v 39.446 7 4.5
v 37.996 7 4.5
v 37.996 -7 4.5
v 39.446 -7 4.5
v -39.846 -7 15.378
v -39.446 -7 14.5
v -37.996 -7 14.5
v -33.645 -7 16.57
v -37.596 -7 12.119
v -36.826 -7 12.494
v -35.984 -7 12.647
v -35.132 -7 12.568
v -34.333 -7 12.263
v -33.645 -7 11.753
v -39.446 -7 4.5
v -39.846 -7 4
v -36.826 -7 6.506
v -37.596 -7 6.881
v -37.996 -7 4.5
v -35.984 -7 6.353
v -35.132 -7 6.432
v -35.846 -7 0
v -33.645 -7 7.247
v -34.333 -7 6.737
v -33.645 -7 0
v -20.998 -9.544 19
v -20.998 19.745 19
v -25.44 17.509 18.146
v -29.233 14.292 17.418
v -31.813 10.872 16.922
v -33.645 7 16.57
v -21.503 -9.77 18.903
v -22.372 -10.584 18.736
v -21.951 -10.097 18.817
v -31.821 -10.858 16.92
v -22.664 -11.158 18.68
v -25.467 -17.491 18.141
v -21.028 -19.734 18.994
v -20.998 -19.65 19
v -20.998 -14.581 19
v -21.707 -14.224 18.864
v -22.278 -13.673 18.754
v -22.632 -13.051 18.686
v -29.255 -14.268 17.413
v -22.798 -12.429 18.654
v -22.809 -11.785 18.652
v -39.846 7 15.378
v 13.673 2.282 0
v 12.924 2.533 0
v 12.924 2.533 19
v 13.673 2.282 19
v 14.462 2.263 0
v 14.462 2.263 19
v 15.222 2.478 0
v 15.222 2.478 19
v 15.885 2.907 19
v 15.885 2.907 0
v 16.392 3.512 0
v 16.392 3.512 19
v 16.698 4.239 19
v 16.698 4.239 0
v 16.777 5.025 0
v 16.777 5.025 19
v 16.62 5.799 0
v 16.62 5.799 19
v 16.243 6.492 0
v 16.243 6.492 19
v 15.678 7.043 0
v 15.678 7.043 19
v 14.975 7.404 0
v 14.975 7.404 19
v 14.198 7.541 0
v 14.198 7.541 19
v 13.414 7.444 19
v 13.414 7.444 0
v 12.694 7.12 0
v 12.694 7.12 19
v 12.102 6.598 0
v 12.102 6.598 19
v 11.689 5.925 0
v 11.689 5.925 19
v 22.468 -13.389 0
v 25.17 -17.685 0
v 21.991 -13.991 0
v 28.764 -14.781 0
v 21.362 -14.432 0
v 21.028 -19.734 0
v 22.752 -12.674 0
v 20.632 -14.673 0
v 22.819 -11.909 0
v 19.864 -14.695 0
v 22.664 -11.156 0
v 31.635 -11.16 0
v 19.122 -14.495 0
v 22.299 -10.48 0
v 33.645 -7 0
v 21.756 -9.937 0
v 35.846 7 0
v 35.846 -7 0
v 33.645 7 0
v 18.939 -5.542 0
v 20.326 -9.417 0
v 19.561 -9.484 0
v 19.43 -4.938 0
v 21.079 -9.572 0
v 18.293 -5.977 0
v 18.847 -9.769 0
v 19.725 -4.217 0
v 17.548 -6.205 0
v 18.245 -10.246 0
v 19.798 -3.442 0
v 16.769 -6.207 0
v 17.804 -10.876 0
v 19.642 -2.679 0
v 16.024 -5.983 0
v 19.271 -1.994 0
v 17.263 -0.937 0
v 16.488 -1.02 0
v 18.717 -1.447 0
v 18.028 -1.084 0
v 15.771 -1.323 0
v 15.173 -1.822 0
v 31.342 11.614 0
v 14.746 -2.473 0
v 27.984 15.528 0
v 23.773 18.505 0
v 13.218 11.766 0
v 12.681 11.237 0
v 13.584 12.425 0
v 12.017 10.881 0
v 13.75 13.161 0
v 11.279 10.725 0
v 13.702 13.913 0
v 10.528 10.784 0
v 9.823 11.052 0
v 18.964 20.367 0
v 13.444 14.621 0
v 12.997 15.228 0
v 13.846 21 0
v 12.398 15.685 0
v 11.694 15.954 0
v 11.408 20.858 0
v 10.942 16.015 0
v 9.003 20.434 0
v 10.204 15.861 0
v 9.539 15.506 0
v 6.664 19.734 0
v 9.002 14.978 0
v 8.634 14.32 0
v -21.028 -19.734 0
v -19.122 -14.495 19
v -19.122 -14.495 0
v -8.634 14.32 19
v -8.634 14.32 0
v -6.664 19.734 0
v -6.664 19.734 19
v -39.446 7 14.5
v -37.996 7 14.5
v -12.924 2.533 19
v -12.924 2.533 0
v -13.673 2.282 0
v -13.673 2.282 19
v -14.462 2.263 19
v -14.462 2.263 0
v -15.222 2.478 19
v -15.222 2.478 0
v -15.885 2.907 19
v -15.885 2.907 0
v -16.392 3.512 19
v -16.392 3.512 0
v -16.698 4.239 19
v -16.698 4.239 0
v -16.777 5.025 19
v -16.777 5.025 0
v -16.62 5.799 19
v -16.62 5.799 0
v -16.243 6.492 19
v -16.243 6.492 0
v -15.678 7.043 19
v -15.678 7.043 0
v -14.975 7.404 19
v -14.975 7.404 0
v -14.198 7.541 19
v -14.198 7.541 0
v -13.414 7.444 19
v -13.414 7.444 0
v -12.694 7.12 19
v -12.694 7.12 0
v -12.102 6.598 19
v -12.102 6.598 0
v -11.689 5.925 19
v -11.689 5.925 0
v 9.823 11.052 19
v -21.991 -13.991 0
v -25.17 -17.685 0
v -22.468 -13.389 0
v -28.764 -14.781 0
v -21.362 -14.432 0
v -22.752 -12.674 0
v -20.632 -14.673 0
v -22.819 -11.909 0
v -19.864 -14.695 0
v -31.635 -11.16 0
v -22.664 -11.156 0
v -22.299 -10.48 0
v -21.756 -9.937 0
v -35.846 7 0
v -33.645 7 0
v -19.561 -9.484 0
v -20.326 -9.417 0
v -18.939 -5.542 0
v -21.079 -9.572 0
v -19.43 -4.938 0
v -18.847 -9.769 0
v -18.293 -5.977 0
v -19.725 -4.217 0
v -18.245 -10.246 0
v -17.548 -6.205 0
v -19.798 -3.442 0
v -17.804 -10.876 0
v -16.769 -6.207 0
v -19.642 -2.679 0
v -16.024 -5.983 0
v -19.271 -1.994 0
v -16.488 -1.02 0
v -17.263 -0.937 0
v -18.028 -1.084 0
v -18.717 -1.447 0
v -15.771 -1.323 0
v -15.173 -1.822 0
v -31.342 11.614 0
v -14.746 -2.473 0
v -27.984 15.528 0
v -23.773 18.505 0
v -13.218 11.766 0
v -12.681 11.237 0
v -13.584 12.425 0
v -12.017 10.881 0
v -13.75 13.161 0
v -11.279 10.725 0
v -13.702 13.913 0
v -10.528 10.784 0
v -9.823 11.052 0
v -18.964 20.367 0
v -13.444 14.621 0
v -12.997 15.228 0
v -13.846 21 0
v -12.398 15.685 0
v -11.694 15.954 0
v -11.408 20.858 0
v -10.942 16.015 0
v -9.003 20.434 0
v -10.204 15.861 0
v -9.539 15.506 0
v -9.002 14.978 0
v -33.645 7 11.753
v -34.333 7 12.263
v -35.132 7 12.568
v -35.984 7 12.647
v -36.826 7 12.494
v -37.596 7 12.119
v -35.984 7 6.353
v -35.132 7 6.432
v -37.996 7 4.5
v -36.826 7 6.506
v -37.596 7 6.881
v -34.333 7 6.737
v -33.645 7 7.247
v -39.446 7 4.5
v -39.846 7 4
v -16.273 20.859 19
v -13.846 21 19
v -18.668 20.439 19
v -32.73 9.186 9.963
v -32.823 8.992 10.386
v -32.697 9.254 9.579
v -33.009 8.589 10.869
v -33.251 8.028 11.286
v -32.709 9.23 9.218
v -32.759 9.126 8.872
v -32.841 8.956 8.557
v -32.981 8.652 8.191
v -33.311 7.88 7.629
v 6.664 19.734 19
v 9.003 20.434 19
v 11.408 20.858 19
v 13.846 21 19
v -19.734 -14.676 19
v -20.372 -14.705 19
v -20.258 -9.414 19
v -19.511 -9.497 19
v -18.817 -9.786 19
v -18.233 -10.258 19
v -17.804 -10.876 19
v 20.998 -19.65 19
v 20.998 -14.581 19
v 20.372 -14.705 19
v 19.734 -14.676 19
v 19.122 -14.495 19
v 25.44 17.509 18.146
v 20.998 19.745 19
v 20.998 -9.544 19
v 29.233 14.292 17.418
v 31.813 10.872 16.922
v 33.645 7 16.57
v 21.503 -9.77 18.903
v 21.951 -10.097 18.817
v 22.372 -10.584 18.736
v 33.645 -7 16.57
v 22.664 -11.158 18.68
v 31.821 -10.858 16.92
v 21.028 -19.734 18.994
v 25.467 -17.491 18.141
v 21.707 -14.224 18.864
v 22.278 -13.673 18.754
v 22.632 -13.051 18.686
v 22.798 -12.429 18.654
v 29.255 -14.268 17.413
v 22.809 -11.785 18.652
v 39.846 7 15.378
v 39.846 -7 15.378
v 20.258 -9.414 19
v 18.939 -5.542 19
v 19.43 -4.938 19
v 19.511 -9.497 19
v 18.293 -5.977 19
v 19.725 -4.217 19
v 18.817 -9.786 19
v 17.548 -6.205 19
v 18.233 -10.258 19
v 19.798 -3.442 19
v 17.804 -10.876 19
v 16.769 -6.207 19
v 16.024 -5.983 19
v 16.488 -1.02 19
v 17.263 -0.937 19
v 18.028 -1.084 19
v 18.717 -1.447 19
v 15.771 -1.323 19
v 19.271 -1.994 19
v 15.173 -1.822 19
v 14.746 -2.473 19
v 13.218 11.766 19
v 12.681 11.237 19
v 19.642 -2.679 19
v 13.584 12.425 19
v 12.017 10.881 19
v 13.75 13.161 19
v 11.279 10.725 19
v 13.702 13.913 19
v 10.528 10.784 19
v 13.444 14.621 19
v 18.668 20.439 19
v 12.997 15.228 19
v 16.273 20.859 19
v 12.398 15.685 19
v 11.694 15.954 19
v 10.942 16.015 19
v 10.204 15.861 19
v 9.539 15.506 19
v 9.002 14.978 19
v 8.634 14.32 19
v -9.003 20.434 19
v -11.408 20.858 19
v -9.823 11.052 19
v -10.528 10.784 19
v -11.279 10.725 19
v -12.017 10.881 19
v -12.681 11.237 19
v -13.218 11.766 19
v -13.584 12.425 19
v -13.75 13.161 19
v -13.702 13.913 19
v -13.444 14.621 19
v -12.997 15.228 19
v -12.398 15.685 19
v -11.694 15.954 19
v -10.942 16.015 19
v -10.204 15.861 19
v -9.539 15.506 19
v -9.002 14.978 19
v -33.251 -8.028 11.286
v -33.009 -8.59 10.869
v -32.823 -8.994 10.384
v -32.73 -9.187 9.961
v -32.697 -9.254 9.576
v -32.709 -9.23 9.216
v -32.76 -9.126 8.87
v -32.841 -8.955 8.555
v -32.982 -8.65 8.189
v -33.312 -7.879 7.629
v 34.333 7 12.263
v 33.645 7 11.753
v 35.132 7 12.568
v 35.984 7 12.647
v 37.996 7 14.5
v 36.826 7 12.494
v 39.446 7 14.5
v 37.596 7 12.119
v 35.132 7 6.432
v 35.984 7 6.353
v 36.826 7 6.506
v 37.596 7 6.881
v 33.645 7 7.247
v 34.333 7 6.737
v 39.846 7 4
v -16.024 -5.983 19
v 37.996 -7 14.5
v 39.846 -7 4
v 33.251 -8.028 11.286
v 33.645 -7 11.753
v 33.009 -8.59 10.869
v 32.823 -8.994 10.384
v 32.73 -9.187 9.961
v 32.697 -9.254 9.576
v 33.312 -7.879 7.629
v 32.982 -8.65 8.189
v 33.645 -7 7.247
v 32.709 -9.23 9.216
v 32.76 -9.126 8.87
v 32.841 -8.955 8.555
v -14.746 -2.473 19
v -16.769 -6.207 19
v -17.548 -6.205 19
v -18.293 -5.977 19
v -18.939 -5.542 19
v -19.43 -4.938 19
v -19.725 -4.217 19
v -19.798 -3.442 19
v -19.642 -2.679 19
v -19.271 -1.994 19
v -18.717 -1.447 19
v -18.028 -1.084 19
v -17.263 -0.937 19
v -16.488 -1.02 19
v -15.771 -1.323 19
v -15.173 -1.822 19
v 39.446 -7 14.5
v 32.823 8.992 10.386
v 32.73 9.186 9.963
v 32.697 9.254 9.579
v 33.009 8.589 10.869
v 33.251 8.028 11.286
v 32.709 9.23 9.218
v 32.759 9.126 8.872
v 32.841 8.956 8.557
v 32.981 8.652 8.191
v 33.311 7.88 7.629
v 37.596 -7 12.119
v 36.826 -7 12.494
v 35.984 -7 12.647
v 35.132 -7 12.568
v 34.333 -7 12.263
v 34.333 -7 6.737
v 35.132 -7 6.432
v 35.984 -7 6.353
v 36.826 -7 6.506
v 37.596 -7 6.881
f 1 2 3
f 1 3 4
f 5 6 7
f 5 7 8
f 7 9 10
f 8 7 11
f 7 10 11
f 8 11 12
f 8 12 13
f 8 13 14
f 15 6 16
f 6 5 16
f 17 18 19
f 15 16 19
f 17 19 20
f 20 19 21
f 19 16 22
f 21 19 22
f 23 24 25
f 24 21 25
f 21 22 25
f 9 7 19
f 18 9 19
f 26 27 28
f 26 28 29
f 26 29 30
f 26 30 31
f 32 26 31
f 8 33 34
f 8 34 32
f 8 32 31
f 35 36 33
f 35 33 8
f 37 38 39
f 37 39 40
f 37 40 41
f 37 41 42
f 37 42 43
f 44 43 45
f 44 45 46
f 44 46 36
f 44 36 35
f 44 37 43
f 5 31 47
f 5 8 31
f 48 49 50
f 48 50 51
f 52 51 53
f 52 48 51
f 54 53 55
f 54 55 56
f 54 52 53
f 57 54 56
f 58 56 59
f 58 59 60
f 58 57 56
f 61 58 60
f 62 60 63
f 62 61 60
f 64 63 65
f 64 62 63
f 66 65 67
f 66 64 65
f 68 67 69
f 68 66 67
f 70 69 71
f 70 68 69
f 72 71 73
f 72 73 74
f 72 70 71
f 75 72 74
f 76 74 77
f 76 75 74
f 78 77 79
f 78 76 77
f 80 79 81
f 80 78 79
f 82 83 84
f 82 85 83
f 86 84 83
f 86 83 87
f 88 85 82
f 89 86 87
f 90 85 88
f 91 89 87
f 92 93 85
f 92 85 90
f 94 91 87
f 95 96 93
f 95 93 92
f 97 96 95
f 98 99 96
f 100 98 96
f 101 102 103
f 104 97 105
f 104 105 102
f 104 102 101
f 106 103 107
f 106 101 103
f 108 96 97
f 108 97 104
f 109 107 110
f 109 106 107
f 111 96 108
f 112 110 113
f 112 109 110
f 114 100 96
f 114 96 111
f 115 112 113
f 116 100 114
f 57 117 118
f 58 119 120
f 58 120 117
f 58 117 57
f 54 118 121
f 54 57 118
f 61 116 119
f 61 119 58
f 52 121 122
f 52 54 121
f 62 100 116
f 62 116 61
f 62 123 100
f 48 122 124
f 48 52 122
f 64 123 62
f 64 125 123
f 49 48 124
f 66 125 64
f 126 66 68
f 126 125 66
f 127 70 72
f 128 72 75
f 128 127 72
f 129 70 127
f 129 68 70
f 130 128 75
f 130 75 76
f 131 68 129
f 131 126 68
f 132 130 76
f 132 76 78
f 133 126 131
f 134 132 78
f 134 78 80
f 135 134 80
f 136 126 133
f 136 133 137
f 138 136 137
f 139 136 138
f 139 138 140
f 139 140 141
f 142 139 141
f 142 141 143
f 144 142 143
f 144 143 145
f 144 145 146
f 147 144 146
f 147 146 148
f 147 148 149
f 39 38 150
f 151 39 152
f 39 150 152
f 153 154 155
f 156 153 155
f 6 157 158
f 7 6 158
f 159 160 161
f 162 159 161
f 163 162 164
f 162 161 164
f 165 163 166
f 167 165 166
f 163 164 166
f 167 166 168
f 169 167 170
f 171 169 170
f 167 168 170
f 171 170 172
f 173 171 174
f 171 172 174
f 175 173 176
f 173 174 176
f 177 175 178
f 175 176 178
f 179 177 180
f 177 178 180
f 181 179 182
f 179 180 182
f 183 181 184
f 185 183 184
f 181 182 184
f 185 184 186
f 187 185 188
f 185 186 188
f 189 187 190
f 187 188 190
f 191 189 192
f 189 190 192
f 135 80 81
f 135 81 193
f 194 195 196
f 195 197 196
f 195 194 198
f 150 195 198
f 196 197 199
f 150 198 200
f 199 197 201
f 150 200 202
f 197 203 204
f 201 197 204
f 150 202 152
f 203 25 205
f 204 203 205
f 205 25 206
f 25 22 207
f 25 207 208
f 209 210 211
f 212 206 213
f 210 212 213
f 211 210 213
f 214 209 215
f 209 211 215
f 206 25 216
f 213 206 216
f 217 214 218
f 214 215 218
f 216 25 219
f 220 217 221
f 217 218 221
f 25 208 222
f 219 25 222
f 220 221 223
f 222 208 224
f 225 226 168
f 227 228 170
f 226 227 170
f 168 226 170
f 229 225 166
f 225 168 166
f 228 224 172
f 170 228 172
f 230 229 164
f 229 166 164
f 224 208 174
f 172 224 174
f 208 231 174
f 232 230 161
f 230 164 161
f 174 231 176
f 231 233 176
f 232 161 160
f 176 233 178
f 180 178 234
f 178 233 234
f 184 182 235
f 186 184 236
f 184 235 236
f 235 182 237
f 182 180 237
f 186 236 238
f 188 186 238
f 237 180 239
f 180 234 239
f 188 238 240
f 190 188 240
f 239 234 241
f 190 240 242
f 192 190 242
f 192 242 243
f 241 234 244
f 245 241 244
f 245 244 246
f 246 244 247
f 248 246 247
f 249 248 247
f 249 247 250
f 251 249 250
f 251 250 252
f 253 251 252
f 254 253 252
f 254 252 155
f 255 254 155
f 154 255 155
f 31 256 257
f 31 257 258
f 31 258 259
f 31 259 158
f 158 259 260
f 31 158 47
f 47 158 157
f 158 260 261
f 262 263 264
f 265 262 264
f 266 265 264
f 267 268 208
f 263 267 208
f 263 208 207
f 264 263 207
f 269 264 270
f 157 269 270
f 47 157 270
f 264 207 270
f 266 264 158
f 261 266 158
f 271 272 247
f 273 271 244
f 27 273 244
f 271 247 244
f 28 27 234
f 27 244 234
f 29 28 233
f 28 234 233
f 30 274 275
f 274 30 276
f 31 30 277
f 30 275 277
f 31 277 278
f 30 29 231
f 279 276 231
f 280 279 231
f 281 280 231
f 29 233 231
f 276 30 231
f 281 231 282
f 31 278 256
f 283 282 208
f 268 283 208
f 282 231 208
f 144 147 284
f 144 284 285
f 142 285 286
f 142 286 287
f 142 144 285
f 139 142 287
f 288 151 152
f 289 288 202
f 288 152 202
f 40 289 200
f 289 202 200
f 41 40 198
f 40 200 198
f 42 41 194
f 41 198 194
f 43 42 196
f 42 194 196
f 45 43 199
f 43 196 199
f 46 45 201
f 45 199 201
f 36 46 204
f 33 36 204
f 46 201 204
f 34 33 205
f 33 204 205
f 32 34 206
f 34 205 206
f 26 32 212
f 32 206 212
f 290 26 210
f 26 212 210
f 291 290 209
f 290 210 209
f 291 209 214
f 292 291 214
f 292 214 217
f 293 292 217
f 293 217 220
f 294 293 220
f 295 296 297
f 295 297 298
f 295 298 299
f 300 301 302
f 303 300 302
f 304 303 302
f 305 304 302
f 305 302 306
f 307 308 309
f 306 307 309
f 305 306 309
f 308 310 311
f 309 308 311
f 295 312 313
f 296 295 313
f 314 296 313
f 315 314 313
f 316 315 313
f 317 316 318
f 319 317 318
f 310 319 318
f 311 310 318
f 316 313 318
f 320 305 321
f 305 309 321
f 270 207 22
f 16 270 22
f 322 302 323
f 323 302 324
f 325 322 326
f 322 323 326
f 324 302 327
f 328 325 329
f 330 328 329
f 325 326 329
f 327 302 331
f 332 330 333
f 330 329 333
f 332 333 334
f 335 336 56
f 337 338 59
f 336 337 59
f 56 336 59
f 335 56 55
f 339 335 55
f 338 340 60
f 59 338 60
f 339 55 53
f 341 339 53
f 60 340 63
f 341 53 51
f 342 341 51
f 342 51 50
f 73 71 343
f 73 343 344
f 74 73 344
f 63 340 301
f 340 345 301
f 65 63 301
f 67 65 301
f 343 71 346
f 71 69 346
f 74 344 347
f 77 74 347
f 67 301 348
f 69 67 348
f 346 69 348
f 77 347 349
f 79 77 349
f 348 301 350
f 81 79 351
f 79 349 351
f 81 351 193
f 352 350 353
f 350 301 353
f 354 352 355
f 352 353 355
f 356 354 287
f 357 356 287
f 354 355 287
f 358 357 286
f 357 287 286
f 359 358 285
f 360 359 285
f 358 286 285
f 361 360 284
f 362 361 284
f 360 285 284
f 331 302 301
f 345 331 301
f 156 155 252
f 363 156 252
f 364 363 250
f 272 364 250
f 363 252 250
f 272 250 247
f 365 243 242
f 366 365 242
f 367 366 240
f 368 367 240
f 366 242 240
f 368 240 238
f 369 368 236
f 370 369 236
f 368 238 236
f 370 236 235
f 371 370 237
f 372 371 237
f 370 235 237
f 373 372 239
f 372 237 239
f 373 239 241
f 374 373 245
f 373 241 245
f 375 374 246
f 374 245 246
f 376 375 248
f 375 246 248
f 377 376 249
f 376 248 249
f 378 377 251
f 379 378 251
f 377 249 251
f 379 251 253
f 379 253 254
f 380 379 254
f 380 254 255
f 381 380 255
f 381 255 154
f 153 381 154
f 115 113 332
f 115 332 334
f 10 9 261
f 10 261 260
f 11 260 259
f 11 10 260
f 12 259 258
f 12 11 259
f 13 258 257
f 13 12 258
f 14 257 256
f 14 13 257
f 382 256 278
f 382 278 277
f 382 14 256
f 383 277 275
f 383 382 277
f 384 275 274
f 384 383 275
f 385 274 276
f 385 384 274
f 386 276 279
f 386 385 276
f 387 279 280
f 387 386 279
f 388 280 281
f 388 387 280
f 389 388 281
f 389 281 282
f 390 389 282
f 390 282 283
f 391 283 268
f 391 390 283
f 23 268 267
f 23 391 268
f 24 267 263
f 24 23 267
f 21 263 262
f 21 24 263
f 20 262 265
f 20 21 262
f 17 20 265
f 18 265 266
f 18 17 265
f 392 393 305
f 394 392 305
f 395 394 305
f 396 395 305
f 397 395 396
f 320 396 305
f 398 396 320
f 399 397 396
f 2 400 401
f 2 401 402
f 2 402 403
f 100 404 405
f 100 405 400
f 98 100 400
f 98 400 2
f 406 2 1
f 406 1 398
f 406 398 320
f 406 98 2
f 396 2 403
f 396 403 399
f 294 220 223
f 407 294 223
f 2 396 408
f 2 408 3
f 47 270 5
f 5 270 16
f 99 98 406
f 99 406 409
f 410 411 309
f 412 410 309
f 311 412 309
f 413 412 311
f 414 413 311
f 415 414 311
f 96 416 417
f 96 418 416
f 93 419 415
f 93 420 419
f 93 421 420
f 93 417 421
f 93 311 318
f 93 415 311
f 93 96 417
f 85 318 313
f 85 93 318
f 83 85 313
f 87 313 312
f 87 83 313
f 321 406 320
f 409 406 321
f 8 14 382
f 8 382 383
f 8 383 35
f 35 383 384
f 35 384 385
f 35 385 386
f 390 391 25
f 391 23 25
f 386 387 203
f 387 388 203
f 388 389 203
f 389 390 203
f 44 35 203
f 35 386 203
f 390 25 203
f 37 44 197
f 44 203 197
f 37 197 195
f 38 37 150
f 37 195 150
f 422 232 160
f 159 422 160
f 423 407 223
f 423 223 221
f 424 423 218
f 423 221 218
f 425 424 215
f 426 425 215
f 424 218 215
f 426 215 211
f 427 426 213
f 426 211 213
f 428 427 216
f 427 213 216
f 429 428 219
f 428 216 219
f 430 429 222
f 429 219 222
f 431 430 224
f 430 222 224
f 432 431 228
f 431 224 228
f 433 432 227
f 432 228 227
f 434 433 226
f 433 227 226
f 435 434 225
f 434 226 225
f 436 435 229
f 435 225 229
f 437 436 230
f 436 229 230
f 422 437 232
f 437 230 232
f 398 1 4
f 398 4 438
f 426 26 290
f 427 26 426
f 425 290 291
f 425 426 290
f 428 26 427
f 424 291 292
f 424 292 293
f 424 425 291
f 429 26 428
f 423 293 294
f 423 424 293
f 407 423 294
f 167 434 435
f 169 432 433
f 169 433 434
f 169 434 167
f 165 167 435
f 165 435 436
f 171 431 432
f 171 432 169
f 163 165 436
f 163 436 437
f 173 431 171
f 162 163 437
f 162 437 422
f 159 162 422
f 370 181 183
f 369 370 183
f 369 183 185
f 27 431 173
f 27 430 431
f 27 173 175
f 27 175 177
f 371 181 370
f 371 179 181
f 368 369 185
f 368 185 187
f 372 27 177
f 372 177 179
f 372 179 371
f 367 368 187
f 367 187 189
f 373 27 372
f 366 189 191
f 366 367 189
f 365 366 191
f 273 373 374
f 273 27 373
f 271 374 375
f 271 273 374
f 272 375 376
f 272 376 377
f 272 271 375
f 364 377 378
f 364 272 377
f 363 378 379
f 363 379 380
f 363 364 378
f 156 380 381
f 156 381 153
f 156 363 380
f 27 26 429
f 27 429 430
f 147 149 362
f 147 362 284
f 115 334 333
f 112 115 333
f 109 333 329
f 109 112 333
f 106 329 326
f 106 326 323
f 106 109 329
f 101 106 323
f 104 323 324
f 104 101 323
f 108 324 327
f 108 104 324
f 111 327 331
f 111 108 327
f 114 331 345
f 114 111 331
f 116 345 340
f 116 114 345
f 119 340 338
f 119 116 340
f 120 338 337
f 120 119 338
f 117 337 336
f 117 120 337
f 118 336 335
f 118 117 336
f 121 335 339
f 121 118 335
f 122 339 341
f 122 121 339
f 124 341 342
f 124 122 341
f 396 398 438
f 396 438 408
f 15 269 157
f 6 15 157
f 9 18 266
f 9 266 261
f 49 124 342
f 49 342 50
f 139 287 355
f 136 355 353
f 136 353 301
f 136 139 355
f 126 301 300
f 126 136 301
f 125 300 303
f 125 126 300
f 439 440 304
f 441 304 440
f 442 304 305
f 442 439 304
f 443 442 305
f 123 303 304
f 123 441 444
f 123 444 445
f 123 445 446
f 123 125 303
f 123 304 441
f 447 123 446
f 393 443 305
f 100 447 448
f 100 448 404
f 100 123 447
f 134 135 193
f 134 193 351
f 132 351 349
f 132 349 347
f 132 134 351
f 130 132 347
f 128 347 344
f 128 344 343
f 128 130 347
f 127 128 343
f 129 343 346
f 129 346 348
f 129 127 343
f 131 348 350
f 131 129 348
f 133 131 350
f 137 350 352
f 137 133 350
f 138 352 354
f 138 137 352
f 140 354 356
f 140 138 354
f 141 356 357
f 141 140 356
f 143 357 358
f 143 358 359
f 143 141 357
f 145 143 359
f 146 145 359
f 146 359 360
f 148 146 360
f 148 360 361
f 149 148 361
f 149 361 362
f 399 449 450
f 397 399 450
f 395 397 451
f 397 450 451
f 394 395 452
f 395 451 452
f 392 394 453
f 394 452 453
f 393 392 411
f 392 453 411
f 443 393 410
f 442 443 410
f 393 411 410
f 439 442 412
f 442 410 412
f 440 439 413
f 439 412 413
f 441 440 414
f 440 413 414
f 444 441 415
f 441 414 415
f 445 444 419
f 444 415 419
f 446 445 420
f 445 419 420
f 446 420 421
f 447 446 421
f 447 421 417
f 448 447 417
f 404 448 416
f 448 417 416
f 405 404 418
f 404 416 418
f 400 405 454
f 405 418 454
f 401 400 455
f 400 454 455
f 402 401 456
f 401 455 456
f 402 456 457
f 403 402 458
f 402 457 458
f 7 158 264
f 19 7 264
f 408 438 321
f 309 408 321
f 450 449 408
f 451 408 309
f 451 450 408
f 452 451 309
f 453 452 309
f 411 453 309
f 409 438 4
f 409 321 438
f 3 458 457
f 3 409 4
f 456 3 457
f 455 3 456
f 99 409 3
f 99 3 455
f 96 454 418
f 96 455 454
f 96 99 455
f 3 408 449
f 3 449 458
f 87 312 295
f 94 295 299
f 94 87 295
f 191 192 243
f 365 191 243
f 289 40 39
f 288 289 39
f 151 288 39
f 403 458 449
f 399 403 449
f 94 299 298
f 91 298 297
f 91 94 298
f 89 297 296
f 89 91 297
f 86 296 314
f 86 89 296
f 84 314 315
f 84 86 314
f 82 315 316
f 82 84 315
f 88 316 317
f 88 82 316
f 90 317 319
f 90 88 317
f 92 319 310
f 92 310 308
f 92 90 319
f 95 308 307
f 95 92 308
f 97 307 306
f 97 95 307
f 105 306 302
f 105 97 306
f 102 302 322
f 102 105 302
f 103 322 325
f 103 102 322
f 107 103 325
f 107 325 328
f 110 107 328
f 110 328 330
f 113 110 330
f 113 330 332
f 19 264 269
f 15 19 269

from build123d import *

# Parameters (mm, degrees)
F1_DEPTH      = 19
F3_DEPTH      = 26.7345450365
F3_DEPTH_BACK = 14.001
F4_SIZE       = 4


with BuildPart() as f1:
    # F0 (on Top) → F1 (new body)
    with BuildSketch(Plane.XY):
        with BuildLine():
            ThreePointArc((-6.6635133854, 19.7335450365), (-10.1993246642, 20.6809628133), (-13.8459363952, 21))
            ThreePointArc((-13.8459363952, 21), (-25.9702920482, 17.1464281995), (-33.6449262685, 7))
            Line((-33.6449262685, 7), (-26.1928457767, 7))
            Line((-26.1928457767, 7), (-26.1928457767, -7))
            Line((-26.1928457767, -7), (-33.6449262685, -7))
            ThreePointArc((-33.6449262685, -7), (-28.7635418529, -14.7805631628), (-21.0283594051, -19.7335450365))
            Line((-21.0283594051, -19.7335450365), (-19.1216743535, -14.4949709112))
            ThreePointArc((-19.1216743535, -14.4949709112), (-22.6637665335, -11.1563362522), (-17.8043335099, -10.8756066898))
            Line((-17.8043335099, -10.8756066898), (-16.0235809599, -5.9830292689))
            ThreePointArc((-16.0235809599, -5.9830292689), (-19.641922738, -2.6788094858), (-14.7462005893, -2.4734555447))
            Line((-14.7462005893, -2.4734555447), (-12.9241629831, 2.5325516357))
            ThreePointArc((-12.9241629831, 2.5325516357), (-16.6200789425, 5.7987172806), (-11.6893922518, 5.9250563382))
            Line((-11.6893922518, 5.9250563382), (-9.823278062, 11.0521629366))
            ThreePointArc((-9.823278062, 11.0521629366), (-13.598235147, 14.2762440471), (-8.6340508586, 14.3195378246))
            Line((-8.6340508586, 14.3195378246), (-6.6635133854, 19.7335450365))
        make_face()
        with BuildLine():
            Line((-26.1928457767, 7), (-33.6449262685, 7))
            ThreePointArc((-33.6449262685, 7), (-34.8459363952, 0), (-33.6449262685, -7))
            Line((-33.6449262685, -7), (-26.1928457767, -7))
            Line((-26.1928457767, -7), (-26.1928457767, 7))
        make_face()
        with BuildLine():
            ThreePointArc((-33.6449262685, -7), (-34.8459363952, 0), (-33.6449262685, 7))
            Line((-33.6449262685, 7), (-39.8459363952, 7))
            Line((-39.8459363952, 7), (-39.8459363952, -7))
            Line((-39.8459363952, -7), (-33.6449262685, -7))
        make_face()
    extrude(amount=F1_DEPTH)

    # F2 (on face) → F3 (cut, two sides)
    with BuildSketch(Plane(origin=(0, 7, 0), x_dir=(-1, 0, 0), z_dir=(0, 1, 0))) as f3_sk:
        with BuildLine():
            Line((37.5959363952, 6.8808398293), (37.5959363952, 12.1191601707))
            ThreePointArc((37.5959363952, 12.1191601707), (32.6959363952, 9.5), (37.5959363952, 6.8808398293))
        make_face()
        Polygon((37.9959363952, 4.5), (39.4459363952, 4.5), (39.4459363952, 14.5), (37.9959363952, 14.5), (37.9959363952, 13.8318650424), (37.9959363952, 11.8021728866), (37.9959363952, 7.1978271134), (37.9959363952, 5.8489135567), align=None)
        Polygon((18.1250255555, 19.5520892739), (40.7956875861, 15.1955494657), (40.7956875861, 19.5520892739), align=None)
    extrude(amount=-F3_DEPTH, mode=Mode.SUBTRACT)
    extrude(f3_sk.sketch, amount=F3_DEPTH_BACK, mode=Mode.SUBTRACT)

    # F4
    f4_edges = [f1.edges().sort_by_distance(p)[0] for p in [
        (-39.845936, 0, 0),
    ]]
    chamfer(f4_edges, length=F4_SIZE)


with BuildPart() as f5_1:
    # F5: instance of F1
    add(f1.part.mirror(Plane.YZ))


solid = Compound([f1.part, f5_1.part])
